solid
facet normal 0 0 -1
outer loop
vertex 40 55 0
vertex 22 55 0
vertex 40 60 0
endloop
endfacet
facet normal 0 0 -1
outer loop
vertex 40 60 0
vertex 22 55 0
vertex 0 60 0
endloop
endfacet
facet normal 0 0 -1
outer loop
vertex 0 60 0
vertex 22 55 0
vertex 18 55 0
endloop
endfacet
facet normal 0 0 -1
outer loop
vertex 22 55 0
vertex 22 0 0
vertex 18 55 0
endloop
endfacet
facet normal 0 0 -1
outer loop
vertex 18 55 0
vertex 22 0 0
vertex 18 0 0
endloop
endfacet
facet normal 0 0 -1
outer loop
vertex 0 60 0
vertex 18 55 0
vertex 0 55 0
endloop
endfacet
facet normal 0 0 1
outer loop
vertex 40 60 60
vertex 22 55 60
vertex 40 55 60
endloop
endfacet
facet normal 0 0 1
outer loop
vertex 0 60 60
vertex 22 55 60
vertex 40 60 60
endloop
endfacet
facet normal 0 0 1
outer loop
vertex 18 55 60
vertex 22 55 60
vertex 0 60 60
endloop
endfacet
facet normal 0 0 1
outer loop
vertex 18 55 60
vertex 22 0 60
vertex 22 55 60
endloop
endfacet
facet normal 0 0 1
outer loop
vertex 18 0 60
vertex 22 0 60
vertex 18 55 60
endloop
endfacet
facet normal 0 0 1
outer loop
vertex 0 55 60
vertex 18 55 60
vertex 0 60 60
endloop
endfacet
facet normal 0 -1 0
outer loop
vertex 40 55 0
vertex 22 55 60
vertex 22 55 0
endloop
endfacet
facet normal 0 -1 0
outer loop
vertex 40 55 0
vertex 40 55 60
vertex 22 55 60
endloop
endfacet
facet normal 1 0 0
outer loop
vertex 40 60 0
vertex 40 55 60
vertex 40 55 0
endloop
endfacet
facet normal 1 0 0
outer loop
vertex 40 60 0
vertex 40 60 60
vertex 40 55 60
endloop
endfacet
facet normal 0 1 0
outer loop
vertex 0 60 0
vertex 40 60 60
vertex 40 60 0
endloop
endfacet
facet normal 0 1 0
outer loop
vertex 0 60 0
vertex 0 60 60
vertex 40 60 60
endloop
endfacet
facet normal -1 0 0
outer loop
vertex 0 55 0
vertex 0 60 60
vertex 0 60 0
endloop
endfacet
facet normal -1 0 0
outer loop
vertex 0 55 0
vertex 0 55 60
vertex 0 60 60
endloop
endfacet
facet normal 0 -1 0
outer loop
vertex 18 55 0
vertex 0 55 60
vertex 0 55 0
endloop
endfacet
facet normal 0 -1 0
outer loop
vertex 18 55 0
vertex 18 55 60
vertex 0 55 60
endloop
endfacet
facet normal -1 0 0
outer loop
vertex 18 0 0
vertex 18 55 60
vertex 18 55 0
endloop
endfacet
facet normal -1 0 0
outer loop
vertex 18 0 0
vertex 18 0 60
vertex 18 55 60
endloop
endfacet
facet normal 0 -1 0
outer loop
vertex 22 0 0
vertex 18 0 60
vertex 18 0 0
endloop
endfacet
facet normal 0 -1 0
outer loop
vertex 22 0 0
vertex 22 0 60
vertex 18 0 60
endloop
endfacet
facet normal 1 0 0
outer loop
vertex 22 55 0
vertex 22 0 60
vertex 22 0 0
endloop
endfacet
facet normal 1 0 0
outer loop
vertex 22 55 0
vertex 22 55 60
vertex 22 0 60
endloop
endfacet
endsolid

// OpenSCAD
$fn = 32;

// ----------------------------------------------------------------------
// Structural section: tee 40 x 60 mm
// ----------------------------------------------------------------------

// --- parameters (mm) ---
sec_w = 40;               // tee width, X
sec_h = 60;               // tee height, Y
flange_t = 5;             // top flange thickness
web_t = 4;                // web thickness
plate_t = 60;             // cut length, Z (extrusion height)

profile = [[18, 0], [22, 0], [22, 55], [40, 55], [40, 60], [0, 60], [0, 55], [18, 55]];  // primary outline, 8 points, counter clockwise

// --- the one profile operation ---
linear_extrude(height = plate_t) polygon(points = profile);
